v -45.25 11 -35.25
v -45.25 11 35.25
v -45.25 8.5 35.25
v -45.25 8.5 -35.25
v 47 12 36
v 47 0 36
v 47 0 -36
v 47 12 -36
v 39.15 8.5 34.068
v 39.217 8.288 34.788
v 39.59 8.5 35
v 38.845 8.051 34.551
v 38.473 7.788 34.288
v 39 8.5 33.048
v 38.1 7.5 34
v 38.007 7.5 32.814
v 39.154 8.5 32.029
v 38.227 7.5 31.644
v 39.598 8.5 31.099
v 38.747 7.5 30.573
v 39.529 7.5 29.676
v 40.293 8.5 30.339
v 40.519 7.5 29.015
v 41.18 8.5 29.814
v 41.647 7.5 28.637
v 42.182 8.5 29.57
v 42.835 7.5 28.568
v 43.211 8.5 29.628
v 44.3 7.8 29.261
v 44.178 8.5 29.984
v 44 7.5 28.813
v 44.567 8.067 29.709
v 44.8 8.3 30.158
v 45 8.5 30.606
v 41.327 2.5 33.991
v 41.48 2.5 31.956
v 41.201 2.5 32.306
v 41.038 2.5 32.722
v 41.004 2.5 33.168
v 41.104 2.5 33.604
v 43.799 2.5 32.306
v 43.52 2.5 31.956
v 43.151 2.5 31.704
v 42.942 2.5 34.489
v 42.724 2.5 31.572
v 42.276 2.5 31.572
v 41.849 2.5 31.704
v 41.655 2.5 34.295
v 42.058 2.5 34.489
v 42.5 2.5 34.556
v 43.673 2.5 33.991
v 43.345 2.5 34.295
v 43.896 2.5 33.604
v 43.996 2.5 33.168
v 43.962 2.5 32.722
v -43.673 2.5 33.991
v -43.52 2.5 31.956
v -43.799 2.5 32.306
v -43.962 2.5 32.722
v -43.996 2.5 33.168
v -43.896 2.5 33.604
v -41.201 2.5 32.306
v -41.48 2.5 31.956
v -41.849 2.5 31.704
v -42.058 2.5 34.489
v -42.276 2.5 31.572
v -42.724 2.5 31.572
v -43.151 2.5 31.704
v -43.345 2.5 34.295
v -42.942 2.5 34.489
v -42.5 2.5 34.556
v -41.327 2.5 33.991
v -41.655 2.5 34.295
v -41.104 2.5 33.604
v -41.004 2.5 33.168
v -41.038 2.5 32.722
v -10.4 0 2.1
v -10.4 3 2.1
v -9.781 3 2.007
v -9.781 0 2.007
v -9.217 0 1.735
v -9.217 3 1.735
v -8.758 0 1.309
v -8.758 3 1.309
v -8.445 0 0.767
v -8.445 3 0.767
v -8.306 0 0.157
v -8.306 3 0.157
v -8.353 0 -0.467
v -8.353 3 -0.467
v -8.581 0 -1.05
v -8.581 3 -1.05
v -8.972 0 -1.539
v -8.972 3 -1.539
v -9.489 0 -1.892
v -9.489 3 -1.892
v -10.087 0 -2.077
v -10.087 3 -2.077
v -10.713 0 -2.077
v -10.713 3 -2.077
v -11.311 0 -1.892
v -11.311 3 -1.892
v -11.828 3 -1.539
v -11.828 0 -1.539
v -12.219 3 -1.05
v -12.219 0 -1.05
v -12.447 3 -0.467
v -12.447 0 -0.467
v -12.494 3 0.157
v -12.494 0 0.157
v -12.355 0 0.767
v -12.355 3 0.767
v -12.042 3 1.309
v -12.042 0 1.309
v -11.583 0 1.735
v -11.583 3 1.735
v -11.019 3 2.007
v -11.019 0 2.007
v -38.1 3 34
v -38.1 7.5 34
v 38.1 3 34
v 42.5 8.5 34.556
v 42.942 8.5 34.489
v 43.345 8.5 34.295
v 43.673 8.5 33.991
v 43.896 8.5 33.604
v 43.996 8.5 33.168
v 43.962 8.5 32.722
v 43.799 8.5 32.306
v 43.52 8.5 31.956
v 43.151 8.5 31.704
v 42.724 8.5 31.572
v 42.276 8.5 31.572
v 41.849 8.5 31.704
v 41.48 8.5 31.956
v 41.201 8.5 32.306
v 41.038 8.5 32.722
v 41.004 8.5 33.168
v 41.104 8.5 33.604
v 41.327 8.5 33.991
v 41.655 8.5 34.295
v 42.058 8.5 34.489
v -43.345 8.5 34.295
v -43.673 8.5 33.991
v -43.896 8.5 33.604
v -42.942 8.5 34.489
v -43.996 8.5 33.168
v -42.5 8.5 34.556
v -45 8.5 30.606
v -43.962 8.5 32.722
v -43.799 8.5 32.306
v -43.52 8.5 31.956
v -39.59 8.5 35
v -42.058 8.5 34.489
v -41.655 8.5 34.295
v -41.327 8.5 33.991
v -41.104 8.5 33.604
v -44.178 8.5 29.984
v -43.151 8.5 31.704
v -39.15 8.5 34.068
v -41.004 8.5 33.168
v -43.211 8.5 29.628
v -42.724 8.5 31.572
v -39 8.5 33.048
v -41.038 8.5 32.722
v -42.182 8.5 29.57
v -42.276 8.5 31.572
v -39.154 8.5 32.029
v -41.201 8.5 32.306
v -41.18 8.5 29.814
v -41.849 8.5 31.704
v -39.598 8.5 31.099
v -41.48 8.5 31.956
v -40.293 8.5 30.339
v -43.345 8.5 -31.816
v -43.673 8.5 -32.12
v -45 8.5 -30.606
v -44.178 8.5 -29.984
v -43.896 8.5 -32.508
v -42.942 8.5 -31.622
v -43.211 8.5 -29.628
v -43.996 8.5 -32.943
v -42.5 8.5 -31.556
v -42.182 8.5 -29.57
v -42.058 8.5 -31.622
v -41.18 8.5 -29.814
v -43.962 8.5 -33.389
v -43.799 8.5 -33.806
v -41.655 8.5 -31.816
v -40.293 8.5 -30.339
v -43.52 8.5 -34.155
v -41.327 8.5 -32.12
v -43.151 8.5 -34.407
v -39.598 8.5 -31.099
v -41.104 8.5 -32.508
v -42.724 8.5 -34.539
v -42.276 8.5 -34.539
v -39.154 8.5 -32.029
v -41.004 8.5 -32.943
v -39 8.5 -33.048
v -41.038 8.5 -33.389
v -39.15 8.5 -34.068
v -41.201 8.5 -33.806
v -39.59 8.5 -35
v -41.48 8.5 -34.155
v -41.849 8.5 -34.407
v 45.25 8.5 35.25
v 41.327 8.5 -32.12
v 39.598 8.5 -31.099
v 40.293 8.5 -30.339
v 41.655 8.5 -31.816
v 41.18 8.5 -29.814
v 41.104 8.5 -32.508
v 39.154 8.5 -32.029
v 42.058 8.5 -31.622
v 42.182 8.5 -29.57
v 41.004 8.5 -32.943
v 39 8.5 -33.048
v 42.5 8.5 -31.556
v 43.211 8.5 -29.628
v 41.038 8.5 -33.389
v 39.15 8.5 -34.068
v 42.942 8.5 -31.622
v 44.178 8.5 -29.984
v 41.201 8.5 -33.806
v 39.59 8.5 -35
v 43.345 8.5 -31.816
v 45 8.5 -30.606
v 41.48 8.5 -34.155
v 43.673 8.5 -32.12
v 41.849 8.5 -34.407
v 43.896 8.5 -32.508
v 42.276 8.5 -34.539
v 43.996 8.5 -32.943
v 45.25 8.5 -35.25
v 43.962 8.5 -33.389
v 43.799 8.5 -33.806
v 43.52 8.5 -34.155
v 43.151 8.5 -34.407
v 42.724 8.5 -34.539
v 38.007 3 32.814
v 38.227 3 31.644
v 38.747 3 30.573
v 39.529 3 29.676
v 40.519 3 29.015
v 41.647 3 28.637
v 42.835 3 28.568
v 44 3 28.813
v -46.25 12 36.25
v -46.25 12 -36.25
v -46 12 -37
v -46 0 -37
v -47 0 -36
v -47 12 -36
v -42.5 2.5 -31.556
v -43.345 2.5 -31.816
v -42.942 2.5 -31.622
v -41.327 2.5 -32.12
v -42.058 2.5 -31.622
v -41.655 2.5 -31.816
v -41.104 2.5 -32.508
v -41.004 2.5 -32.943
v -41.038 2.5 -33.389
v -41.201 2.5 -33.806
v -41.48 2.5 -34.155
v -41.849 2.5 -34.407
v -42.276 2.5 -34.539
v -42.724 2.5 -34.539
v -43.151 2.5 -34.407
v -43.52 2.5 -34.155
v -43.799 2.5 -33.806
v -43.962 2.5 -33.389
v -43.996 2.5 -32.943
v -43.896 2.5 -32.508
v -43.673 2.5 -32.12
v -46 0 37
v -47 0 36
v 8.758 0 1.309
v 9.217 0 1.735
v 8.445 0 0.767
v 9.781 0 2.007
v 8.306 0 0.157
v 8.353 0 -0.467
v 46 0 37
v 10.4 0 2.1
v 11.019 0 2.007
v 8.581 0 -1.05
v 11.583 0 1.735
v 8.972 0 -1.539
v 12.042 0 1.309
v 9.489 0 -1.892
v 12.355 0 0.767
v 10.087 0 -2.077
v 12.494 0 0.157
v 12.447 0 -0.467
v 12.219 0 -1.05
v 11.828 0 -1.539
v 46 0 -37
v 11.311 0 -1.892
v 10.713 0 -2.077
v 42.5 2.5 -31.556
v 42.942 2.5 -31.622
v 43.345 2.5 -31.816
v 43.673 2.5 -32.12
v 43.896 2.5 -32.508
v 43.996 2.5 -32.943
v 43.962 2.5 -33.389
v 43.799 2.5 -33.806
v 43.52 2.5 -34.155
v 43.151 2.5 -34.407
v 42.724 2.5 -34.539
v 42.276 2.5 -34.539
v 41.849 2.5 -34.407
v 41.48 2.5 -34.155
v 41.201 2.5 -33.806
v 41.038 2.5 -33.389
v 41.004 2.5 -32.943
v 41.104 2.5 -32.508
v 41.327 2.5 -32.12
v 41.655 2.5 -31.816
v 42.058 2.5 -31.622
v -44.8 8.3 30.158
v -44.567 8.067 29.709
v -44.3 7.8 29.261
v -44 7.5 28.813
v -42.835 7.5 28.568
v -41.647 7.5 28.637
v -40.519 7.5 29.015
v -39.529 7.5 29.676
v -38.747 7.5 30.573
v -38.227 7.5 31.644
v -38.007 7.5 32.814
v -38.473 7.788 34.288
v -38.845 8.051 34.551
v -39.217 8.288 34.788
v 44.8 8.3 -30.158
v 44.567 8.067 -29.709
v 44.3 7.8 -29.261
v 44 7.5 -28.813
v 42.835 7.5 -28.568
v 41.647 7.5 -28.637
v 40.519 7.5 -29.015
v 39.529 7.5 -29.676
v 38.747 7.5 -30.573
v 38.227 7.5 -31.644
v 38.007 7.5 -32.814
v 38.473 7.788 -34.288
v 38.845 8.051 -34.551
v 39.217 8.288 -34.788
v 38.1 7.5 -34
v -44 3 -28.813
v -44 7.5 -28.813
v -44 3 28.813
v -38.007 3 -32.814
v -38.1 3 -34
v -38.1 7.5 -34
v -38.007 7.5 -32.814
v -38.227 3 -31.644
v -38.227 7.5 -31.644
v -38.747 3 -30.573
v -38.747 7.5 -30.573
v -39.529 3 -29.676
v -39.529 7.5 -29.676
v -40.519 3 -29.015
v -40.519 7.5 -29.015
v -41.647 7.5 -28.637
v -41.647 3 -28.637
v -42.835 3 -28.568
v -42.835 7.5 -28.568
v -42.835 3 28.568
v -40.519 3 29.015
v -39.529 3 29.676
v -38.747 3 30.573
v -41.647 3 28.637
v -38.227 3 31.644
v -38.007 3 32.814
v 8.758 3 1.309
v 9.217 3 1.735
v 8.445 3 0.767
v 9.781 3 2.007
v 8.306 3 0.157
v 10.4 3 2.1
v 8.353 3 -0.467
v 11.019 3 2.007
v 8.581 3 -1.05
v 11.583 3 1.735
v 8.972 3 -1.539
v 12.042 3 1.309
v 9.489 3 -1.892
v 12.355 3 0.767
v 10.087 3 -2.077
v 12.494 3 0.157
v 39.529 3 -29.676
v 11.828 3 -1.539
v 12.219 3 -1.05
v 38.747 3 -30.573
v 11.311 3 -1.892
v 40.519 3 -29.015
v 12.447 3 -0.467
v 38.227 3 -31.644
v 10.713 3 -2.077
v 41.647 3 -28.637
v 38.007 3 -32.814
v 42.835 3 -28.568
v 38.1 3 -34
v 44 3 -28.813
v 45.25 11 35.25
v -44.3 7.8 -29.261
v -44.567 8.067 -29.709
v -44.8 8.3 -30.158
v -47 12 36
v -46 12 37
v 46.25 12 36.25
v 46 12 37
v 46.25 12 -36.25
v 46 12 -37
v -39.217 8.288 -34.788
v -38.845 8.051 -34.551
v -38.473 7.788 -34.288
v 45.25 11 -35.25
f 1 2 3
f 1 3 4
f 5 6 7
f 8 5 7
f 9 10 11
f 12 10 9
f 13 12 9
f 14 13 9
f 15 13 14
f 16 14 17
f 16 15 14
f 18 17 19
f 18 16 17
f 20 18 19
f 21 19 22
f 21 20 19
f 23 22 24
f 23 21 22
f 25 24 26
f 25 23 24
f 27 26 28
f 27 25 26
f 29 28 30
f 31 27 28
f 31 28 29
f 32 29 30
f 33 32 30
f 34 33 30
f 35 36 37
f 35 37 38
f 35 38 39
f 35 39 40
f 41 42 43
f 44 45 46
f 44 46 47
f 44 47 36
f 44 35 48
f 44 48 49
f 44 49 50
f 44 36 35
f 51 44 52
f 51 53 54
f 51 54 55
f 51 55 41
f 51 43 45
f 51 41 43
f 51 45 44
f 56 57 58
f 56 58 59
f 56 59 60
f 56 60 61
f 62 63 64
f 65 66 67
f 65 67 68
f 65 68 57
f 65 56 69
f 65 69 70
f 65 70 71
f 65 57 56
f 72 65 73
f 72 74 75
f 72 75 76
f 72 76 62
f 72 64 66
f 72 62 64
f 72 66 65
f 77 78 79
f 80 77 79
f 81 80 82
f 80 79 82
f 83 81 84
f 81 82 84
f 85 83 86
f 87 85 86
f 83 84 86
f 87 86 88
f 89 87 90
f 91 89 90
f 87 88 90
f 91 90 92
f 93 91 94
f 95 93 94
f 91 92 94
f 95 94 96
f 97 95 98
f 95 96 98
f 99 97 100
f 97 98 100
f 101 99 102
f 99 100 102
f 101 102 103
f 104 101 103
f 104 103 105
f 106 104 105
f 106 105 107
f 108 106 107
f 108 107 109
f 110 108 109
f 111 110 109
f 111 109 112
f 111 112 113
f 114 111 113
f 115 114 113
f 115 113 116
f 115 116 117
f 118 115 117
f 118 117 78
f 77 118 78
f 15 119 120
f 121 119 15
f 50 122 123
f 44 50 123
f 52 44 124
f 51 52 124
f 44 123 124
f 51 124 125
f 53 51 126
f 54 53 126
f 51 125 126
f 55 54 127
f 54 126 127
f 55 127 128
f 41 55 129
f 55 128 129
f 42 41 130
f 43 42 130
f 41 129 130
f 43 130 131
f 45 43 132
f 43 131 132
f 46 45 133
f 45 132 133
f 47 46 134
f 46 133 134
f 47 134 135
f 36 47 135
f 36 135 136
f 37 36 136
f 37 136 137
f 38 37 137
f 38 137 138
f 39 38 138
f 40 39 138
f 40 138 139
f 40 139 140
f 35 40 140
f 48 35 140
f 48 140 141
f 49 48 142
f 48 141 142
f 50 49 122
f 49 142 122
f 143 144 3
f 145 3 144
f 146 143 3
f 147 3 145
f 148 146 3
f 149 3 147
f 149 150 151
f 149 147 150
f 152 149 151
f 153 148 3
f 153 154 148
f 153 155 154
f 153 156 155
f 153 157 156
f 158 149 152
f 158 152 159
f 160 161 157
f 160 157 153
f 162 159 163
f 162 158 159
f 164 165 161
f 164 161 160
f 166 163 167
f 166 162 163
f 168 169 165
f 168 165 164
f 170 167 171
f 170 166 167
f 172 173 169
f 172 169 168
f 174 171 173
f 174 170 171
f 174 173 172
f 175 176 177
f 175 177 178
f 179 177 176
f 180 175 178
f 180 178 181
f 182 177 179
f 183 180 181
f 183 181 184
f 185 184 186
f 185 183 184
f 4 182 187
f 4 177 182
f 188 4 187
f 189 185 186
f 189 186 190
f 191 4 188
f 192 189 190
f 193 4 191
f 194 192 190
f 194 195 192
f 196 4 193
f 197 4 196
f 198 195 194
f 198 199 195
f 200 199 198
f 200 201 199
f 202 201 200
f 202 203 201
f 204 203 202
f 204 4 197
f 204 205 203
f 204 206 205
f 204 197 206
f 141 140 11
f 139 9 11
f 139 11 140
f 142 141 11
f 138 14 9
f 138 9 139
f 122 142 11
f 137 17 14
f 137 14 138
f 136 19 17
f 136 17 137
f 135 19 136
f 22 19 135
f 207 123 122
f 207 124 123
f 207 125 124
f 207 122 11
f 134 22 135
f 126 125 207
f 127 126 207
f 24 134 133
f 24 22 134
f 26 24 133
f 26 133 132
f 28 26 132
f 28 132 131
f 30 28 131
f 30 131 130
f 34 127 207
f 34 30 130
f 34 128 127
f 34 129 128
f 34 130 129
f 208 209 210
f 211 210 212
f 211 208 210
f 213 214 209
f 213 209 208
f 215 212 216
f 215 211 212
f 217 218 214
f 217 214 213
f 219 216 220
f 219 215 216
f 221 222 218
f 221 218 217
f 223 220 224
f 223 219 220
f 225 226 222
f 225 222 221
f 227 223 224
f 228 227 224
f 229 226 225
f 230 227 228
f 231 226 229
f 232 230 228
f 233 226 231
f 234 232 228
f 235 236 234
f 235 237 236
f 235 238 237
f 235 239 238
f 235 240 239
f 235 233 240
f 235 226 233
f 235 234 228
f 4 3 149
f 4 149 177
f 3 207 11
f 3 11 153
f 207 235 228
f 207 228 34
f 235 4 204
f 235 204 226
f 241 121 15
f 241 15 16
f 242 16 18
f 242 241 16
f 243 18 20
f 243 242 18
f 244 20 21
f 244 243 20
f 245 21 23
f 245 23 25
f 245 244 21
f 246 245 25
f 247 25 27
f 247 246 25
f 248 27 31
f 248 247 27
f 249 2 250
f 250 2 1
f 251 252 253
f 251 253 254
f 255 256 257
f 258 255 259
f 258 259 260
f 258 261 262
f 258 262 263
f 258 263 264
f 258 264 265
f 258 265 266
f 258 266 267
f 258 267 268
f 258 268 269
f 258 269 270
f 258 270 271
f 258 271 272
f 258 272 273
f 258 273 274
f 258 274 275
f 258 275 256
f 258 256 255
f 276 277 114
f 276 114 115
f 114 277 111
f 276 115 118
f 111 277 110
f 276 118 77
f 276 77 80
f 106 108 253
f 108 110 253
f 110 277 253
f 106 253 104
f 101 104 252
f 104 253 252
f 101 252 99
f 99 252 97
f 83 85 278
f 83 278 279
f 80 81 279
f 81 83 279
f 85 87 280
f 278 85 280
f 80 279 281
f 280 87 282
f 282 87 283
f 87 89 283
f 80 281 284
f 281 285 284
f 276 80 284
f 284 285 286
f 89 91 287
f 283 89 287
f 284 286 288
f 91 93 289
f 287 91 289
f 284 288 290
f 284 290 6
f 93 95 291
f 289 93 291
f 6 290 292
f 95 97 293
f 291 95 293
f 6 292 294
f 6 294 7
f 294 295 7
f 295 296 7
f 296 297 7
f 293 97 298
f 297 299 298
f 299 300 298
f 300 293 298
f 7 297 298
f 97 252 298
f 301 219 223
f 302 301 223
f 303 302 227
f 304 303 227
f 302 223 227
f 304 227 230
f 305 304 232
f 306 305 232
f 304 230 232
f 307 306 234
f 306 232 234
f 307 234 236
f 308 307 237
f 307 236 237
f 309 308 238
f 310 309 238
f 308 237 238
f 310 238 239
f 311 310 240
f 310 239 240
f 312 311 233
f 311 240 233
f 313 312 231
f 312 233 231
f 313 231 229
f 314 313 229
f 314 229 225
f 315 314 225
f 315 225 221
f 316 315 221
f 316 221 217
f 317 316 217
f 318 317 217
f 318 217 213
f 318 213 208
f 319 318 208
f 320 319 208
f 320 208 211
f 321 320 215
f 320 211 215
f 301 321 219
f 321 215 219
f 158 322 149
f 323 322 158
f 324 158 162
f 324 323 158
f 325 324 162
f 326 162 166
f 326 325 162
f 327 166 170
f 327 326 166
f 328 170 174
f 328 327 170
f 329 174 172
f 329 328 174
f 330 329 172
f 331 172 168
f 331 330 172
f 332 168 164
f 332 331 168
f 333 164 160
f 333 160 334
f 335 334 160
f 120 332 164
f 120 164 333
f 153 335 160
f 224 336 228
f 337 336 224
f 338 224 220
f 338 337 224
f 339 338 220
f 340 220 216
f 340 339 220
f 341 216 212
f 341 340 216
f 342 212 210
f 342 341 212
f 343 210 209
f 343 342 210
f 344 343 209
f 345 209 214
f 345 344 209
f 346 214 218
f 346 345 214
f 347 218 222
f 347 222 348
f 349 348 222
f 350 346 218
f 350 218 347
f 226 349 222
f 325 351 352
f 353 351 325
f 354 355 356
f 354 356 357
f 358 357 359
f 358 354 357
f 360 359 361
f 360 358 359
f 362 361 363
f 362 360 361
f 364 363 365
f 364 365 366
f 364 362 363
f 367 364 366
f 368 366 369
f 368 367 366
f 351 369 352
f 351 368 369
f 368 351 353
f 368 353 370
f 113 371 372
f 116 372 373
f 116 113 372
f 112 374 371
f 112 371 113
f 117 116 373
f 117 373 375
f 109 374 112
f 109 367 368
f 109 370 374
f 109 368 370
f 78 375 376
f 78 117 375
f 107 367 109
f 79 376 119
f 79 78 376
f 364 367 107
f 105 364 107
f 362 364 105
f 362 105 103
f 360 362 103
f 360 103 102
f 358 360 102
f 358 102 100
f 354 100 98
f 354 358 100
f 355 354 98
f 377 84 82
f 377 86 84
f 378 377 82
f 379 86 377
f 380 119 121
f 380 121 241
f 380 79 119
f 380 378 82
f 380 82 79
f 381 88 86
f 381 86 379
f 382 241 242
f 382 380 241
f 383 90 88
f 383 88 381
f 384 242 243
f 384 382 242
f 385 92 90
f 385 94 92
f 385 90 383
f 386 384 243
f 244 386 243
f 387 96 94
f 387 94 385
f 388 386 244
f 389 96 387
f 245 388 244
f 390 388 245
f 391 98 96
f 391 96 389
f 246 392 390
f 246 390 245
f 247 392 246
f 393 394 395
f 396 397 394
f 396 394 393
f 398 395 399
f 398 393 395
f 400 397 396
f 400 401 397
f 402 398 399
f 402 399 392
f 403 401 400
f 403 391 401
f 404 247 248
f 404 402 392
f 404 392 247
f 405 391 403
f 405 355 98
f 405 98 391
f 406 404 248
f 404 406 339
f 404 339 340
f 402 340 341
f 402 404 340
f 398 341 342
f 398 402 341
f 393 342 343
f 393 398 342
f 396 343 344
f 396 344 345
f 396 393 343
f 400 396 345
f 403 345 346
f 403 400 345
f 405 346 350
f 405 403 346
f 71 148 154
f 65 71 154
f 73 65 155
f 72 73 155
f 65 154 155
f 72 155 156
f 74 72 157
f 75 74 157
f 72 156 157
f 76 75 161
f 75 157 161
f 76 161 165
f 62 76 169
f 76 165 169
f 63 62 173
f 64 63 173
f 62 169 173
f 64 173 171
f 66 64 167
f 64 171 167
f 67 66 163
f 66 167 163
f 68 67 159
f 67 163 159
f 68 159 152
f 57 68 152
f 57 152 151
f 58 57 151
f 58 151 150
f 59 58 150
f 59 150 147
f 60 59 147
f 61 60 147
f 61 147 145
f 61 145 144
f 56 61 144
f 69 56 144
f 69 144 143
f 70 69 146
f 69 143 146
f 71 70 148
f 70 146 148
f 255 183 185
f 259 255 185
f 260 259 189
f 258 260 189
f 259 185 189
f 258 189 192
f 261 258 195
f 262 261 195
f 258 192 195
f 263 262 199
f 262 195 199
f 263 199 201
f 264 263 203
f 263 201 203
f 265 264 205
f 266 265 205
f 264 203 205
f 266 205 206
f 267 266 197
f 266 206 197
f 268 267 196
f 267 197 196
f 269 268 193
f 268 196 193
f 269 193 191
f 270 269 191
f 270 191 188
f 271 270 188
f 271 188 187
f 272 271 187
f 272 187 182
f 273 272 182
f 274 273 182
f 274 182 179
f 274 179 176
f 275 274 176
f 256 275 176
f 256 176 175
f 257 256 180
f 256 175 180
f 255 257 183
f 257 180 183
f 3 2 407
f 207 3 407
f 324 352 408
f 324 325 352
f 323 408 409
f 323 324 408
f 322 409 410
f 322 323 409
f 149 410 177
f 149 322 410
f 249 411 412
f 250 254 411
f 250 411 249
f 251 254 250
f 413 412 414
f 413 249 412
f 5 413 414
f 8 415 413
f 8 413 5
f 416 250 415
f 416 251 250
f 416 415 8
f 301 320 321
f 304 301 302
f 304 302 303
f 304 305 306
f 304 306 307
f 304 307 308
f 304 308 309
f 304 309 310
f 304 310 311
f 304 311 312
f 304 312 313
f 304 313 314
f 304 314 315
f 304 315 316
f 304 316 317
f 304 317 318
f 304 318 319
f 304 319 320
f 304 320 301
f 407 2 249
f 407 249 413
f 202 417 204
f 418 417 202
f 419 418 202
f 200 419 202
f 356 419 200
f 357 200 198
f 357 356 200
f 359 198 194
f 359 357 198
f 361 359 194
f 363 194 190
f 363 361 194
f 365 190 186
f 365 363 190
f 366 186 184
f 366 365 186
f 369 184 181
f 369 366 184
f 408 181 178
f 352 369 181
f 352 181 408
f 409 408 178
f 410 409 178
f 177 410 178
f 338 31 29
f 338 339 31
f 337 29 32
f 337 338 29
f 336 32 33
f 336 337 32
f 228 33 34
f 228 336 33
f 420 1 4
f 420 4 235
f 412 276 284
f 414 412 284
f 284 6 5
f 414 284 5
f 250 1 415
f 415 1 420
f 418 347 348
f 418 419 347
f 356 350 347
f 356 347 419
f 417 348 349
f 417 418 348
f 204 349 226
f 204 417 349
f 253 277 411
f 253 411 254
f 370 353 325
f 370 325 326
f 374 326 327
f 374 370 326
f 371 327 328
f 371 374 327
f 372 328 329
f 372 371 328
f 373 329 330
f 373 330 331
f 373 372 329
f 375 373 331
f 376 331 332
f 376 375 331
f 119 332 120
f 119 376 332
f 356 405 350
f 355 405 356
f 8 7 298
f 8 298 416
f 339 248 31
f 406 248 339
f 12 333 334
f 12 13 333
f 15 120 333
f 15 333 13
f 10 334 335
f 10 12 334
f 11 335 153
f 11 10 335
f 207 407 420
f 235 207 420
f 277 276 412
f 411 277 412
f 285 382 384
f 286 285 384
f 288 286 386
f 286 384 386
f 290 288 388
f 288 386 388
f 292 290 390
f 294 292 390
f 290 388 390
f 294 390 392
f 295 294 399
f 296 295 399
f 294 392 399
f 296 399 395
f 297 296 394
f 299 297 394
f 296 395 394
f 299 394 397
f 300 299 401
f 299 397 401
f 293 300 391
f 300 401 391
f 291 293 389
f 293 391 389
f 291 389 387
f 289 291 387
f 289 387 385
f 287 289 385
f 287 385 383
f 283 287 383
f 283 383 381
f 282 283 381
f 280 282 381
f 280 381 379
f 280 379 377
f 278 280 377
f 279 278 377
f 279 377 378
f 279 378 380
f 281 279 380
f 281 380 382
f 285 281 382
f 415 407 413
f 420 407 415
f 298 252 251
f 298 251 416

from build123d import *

# Parameters (mm, degrees)
SKETCH1_W           = 94
SKETCH1_H           = 74
BOSS_EXTRUDE1_DEPTH = 12
SKETCH2_W           = 90.5
SKETCH2_H           = 70.5
CUT_EXTRUDE1_DEPTH  = 3.5
SKETCH3_R           = 1.5
CUT_EXTRUDE2_DEPTH  = 6
SHELL1_START        = 3
SHELL1_DEPTH        = 5.5
CHAMFER1_SIZE       = 1
CHAMFER2_SIZE       = 1
CHAMFER3_SIZE       = 1
SKETCH4_R           = 2.1
CUT_EXTRUDE3_DEPTH  = 61.489668539


# Read off the part's stored shape, not the designer's step: Shell1
with BuildPart() as part:
    # Sketch1 → Boss-Extrude1 (new body)
    with BuildSketch(Plane(origin=(0, 0, 0), x_dir=(1, 0, 0), z_dir=(0, 1, 0))):
        Rectangle(SKETCH1_W, SKETCH1_H)
    extrude(amount=BOSS_EXTRUDE1_DEPTH)

    # Sketch2 → Cut-Extrude1 (cut)
    with BuildSketch(Plane(origin=(0, 12, 0), x_dir=(1, 0, 0), z_dir=(0, 1, 0))):
        Rectangle(SKETCH2_W, SKETCH2_H)
    extrude(amount=-CUT_EXTRUDE1_DEPTH, mode=Mode.SUBTRACT)

    # Sketch3 → Cut-Extrude2 (cut)
    with BuildSketch(Plane(origin=(0, 8.5, 0), x_dir=(1, 0, 0), z_dir=(0, 1, 0))):
        with Locations(Location((-42.5, 33.055555556, 0), (0, 0, 270))):
            Circle(SKETCH3_R)
        with Locations(Location((42.5, 33.055555556, 0), (0, 0, 270))):
            Circle(SKETCH3_R)
        with Locations(Location((42.5, -33.055555556, 0), (0, 0, 270))):
            Circle(SKETCH3_R)
        with Locations(Location((-42.5, -33.055555556, 0), (0, 0, 270))):
            Circle(SKETCH3_R)
    extrude(amount=-CUT_EXTRUDE2_DEPTH, mode=Mode.SUBTRACT)

    # Shell1 outline → Shell1 (cut)
    with BuildSketch(Plane(origin=(0, 0, 0), x_dir=(1, 0, 0), z_dir=(0, 1, 0)).offset(SHELL1_START)):
        with BuildLine():
            Line((-38.100224473, -34), (38.100224473, -34))
            ThreePointArc((38.100224473, -34), (39.528697665, -29.67600493), (44, -28.812914868))
            Line((44, -28.812914868), (44, 28.812914868))
            ThreePointArc((44, 28.812914868), (39.528697665, 29.67600493), (38.100224473, 34))
            Line((38.100224473, 34), (-38.100224473, 34))
            ThreePointArc((-38.100224473, 34), (-39.528697665, 29.67600493), (-44, 28.812914868))
            Line((-44, 28.812914868), (-44, -28.812914868))
            ThreePointArc((-44, -28.812914868), (-39.528697665, -29.67600493), (-38.100224473, -34))
        make_face()
    extrude(amount=SHELL1_DEPTH, mode=Mode.SUBTRACT)

    # Chamfer1
    chamfer1_edges = [part.edges().sort_by_distance(p)[0] for p in [
        (45.25, 12, 0),
        (0, 12, -35.25),
        (-45.25, 12, 0),
        (0, 12, 35.25),
    ]]
    chamfer(chamfer1_edges, length=CHAMFER1_SIZE)

    # Chamfer2
    chamfer2_edges = [part.edges().sort_by_distance(p)[0] for p in [
        (0, 8.5, 34),
        (44, 8.5, 0),
        (0, 8.5, -34),
        (-44, 8.5, 0),
        (-39.528697665, 8.5, -29.67600493),
        (39.528697665, 8.5, -29.67600493),
        (39.528697665, 8.5, 29.67600493),
        (-39.528697665, 8.5, 29.67600493),
    ]]
    chamfer(chamfer2_edges, length=CHAMFER2_SIZE)

    # Chamfer3
    chamfer3_edges = [part.edges().sort_by_distance(p)[0] for p in [
        (-47, 6, 37),
        (-47, 6, -37),
        (47, 6, -37),
        (47, 6, 37),
    ]]
    chamfer(chamfer3_edges, length=CHAMFER3_SIZE)

    # Sketch4 → Cut-Extrude3 (cut, through all)
    with BuildSketch(Plane(origin=(0, 3, 0), x_dir=(1, 0, 0), z_dir=(0, 1, 0))):
        with Locations(Location((-10.4, 0, 0), (0, 0, 270))):
            Circle(SKETCH4_R)
        with Locations(Location((10.4, 0, 0), (0, 0, 270))):
            Circle(SKETCH4_R)
    extrude(amount=-CUT_EXTRUDE3_DEPTH, mode=Mode.SUBTRACT)


solid = part.part
